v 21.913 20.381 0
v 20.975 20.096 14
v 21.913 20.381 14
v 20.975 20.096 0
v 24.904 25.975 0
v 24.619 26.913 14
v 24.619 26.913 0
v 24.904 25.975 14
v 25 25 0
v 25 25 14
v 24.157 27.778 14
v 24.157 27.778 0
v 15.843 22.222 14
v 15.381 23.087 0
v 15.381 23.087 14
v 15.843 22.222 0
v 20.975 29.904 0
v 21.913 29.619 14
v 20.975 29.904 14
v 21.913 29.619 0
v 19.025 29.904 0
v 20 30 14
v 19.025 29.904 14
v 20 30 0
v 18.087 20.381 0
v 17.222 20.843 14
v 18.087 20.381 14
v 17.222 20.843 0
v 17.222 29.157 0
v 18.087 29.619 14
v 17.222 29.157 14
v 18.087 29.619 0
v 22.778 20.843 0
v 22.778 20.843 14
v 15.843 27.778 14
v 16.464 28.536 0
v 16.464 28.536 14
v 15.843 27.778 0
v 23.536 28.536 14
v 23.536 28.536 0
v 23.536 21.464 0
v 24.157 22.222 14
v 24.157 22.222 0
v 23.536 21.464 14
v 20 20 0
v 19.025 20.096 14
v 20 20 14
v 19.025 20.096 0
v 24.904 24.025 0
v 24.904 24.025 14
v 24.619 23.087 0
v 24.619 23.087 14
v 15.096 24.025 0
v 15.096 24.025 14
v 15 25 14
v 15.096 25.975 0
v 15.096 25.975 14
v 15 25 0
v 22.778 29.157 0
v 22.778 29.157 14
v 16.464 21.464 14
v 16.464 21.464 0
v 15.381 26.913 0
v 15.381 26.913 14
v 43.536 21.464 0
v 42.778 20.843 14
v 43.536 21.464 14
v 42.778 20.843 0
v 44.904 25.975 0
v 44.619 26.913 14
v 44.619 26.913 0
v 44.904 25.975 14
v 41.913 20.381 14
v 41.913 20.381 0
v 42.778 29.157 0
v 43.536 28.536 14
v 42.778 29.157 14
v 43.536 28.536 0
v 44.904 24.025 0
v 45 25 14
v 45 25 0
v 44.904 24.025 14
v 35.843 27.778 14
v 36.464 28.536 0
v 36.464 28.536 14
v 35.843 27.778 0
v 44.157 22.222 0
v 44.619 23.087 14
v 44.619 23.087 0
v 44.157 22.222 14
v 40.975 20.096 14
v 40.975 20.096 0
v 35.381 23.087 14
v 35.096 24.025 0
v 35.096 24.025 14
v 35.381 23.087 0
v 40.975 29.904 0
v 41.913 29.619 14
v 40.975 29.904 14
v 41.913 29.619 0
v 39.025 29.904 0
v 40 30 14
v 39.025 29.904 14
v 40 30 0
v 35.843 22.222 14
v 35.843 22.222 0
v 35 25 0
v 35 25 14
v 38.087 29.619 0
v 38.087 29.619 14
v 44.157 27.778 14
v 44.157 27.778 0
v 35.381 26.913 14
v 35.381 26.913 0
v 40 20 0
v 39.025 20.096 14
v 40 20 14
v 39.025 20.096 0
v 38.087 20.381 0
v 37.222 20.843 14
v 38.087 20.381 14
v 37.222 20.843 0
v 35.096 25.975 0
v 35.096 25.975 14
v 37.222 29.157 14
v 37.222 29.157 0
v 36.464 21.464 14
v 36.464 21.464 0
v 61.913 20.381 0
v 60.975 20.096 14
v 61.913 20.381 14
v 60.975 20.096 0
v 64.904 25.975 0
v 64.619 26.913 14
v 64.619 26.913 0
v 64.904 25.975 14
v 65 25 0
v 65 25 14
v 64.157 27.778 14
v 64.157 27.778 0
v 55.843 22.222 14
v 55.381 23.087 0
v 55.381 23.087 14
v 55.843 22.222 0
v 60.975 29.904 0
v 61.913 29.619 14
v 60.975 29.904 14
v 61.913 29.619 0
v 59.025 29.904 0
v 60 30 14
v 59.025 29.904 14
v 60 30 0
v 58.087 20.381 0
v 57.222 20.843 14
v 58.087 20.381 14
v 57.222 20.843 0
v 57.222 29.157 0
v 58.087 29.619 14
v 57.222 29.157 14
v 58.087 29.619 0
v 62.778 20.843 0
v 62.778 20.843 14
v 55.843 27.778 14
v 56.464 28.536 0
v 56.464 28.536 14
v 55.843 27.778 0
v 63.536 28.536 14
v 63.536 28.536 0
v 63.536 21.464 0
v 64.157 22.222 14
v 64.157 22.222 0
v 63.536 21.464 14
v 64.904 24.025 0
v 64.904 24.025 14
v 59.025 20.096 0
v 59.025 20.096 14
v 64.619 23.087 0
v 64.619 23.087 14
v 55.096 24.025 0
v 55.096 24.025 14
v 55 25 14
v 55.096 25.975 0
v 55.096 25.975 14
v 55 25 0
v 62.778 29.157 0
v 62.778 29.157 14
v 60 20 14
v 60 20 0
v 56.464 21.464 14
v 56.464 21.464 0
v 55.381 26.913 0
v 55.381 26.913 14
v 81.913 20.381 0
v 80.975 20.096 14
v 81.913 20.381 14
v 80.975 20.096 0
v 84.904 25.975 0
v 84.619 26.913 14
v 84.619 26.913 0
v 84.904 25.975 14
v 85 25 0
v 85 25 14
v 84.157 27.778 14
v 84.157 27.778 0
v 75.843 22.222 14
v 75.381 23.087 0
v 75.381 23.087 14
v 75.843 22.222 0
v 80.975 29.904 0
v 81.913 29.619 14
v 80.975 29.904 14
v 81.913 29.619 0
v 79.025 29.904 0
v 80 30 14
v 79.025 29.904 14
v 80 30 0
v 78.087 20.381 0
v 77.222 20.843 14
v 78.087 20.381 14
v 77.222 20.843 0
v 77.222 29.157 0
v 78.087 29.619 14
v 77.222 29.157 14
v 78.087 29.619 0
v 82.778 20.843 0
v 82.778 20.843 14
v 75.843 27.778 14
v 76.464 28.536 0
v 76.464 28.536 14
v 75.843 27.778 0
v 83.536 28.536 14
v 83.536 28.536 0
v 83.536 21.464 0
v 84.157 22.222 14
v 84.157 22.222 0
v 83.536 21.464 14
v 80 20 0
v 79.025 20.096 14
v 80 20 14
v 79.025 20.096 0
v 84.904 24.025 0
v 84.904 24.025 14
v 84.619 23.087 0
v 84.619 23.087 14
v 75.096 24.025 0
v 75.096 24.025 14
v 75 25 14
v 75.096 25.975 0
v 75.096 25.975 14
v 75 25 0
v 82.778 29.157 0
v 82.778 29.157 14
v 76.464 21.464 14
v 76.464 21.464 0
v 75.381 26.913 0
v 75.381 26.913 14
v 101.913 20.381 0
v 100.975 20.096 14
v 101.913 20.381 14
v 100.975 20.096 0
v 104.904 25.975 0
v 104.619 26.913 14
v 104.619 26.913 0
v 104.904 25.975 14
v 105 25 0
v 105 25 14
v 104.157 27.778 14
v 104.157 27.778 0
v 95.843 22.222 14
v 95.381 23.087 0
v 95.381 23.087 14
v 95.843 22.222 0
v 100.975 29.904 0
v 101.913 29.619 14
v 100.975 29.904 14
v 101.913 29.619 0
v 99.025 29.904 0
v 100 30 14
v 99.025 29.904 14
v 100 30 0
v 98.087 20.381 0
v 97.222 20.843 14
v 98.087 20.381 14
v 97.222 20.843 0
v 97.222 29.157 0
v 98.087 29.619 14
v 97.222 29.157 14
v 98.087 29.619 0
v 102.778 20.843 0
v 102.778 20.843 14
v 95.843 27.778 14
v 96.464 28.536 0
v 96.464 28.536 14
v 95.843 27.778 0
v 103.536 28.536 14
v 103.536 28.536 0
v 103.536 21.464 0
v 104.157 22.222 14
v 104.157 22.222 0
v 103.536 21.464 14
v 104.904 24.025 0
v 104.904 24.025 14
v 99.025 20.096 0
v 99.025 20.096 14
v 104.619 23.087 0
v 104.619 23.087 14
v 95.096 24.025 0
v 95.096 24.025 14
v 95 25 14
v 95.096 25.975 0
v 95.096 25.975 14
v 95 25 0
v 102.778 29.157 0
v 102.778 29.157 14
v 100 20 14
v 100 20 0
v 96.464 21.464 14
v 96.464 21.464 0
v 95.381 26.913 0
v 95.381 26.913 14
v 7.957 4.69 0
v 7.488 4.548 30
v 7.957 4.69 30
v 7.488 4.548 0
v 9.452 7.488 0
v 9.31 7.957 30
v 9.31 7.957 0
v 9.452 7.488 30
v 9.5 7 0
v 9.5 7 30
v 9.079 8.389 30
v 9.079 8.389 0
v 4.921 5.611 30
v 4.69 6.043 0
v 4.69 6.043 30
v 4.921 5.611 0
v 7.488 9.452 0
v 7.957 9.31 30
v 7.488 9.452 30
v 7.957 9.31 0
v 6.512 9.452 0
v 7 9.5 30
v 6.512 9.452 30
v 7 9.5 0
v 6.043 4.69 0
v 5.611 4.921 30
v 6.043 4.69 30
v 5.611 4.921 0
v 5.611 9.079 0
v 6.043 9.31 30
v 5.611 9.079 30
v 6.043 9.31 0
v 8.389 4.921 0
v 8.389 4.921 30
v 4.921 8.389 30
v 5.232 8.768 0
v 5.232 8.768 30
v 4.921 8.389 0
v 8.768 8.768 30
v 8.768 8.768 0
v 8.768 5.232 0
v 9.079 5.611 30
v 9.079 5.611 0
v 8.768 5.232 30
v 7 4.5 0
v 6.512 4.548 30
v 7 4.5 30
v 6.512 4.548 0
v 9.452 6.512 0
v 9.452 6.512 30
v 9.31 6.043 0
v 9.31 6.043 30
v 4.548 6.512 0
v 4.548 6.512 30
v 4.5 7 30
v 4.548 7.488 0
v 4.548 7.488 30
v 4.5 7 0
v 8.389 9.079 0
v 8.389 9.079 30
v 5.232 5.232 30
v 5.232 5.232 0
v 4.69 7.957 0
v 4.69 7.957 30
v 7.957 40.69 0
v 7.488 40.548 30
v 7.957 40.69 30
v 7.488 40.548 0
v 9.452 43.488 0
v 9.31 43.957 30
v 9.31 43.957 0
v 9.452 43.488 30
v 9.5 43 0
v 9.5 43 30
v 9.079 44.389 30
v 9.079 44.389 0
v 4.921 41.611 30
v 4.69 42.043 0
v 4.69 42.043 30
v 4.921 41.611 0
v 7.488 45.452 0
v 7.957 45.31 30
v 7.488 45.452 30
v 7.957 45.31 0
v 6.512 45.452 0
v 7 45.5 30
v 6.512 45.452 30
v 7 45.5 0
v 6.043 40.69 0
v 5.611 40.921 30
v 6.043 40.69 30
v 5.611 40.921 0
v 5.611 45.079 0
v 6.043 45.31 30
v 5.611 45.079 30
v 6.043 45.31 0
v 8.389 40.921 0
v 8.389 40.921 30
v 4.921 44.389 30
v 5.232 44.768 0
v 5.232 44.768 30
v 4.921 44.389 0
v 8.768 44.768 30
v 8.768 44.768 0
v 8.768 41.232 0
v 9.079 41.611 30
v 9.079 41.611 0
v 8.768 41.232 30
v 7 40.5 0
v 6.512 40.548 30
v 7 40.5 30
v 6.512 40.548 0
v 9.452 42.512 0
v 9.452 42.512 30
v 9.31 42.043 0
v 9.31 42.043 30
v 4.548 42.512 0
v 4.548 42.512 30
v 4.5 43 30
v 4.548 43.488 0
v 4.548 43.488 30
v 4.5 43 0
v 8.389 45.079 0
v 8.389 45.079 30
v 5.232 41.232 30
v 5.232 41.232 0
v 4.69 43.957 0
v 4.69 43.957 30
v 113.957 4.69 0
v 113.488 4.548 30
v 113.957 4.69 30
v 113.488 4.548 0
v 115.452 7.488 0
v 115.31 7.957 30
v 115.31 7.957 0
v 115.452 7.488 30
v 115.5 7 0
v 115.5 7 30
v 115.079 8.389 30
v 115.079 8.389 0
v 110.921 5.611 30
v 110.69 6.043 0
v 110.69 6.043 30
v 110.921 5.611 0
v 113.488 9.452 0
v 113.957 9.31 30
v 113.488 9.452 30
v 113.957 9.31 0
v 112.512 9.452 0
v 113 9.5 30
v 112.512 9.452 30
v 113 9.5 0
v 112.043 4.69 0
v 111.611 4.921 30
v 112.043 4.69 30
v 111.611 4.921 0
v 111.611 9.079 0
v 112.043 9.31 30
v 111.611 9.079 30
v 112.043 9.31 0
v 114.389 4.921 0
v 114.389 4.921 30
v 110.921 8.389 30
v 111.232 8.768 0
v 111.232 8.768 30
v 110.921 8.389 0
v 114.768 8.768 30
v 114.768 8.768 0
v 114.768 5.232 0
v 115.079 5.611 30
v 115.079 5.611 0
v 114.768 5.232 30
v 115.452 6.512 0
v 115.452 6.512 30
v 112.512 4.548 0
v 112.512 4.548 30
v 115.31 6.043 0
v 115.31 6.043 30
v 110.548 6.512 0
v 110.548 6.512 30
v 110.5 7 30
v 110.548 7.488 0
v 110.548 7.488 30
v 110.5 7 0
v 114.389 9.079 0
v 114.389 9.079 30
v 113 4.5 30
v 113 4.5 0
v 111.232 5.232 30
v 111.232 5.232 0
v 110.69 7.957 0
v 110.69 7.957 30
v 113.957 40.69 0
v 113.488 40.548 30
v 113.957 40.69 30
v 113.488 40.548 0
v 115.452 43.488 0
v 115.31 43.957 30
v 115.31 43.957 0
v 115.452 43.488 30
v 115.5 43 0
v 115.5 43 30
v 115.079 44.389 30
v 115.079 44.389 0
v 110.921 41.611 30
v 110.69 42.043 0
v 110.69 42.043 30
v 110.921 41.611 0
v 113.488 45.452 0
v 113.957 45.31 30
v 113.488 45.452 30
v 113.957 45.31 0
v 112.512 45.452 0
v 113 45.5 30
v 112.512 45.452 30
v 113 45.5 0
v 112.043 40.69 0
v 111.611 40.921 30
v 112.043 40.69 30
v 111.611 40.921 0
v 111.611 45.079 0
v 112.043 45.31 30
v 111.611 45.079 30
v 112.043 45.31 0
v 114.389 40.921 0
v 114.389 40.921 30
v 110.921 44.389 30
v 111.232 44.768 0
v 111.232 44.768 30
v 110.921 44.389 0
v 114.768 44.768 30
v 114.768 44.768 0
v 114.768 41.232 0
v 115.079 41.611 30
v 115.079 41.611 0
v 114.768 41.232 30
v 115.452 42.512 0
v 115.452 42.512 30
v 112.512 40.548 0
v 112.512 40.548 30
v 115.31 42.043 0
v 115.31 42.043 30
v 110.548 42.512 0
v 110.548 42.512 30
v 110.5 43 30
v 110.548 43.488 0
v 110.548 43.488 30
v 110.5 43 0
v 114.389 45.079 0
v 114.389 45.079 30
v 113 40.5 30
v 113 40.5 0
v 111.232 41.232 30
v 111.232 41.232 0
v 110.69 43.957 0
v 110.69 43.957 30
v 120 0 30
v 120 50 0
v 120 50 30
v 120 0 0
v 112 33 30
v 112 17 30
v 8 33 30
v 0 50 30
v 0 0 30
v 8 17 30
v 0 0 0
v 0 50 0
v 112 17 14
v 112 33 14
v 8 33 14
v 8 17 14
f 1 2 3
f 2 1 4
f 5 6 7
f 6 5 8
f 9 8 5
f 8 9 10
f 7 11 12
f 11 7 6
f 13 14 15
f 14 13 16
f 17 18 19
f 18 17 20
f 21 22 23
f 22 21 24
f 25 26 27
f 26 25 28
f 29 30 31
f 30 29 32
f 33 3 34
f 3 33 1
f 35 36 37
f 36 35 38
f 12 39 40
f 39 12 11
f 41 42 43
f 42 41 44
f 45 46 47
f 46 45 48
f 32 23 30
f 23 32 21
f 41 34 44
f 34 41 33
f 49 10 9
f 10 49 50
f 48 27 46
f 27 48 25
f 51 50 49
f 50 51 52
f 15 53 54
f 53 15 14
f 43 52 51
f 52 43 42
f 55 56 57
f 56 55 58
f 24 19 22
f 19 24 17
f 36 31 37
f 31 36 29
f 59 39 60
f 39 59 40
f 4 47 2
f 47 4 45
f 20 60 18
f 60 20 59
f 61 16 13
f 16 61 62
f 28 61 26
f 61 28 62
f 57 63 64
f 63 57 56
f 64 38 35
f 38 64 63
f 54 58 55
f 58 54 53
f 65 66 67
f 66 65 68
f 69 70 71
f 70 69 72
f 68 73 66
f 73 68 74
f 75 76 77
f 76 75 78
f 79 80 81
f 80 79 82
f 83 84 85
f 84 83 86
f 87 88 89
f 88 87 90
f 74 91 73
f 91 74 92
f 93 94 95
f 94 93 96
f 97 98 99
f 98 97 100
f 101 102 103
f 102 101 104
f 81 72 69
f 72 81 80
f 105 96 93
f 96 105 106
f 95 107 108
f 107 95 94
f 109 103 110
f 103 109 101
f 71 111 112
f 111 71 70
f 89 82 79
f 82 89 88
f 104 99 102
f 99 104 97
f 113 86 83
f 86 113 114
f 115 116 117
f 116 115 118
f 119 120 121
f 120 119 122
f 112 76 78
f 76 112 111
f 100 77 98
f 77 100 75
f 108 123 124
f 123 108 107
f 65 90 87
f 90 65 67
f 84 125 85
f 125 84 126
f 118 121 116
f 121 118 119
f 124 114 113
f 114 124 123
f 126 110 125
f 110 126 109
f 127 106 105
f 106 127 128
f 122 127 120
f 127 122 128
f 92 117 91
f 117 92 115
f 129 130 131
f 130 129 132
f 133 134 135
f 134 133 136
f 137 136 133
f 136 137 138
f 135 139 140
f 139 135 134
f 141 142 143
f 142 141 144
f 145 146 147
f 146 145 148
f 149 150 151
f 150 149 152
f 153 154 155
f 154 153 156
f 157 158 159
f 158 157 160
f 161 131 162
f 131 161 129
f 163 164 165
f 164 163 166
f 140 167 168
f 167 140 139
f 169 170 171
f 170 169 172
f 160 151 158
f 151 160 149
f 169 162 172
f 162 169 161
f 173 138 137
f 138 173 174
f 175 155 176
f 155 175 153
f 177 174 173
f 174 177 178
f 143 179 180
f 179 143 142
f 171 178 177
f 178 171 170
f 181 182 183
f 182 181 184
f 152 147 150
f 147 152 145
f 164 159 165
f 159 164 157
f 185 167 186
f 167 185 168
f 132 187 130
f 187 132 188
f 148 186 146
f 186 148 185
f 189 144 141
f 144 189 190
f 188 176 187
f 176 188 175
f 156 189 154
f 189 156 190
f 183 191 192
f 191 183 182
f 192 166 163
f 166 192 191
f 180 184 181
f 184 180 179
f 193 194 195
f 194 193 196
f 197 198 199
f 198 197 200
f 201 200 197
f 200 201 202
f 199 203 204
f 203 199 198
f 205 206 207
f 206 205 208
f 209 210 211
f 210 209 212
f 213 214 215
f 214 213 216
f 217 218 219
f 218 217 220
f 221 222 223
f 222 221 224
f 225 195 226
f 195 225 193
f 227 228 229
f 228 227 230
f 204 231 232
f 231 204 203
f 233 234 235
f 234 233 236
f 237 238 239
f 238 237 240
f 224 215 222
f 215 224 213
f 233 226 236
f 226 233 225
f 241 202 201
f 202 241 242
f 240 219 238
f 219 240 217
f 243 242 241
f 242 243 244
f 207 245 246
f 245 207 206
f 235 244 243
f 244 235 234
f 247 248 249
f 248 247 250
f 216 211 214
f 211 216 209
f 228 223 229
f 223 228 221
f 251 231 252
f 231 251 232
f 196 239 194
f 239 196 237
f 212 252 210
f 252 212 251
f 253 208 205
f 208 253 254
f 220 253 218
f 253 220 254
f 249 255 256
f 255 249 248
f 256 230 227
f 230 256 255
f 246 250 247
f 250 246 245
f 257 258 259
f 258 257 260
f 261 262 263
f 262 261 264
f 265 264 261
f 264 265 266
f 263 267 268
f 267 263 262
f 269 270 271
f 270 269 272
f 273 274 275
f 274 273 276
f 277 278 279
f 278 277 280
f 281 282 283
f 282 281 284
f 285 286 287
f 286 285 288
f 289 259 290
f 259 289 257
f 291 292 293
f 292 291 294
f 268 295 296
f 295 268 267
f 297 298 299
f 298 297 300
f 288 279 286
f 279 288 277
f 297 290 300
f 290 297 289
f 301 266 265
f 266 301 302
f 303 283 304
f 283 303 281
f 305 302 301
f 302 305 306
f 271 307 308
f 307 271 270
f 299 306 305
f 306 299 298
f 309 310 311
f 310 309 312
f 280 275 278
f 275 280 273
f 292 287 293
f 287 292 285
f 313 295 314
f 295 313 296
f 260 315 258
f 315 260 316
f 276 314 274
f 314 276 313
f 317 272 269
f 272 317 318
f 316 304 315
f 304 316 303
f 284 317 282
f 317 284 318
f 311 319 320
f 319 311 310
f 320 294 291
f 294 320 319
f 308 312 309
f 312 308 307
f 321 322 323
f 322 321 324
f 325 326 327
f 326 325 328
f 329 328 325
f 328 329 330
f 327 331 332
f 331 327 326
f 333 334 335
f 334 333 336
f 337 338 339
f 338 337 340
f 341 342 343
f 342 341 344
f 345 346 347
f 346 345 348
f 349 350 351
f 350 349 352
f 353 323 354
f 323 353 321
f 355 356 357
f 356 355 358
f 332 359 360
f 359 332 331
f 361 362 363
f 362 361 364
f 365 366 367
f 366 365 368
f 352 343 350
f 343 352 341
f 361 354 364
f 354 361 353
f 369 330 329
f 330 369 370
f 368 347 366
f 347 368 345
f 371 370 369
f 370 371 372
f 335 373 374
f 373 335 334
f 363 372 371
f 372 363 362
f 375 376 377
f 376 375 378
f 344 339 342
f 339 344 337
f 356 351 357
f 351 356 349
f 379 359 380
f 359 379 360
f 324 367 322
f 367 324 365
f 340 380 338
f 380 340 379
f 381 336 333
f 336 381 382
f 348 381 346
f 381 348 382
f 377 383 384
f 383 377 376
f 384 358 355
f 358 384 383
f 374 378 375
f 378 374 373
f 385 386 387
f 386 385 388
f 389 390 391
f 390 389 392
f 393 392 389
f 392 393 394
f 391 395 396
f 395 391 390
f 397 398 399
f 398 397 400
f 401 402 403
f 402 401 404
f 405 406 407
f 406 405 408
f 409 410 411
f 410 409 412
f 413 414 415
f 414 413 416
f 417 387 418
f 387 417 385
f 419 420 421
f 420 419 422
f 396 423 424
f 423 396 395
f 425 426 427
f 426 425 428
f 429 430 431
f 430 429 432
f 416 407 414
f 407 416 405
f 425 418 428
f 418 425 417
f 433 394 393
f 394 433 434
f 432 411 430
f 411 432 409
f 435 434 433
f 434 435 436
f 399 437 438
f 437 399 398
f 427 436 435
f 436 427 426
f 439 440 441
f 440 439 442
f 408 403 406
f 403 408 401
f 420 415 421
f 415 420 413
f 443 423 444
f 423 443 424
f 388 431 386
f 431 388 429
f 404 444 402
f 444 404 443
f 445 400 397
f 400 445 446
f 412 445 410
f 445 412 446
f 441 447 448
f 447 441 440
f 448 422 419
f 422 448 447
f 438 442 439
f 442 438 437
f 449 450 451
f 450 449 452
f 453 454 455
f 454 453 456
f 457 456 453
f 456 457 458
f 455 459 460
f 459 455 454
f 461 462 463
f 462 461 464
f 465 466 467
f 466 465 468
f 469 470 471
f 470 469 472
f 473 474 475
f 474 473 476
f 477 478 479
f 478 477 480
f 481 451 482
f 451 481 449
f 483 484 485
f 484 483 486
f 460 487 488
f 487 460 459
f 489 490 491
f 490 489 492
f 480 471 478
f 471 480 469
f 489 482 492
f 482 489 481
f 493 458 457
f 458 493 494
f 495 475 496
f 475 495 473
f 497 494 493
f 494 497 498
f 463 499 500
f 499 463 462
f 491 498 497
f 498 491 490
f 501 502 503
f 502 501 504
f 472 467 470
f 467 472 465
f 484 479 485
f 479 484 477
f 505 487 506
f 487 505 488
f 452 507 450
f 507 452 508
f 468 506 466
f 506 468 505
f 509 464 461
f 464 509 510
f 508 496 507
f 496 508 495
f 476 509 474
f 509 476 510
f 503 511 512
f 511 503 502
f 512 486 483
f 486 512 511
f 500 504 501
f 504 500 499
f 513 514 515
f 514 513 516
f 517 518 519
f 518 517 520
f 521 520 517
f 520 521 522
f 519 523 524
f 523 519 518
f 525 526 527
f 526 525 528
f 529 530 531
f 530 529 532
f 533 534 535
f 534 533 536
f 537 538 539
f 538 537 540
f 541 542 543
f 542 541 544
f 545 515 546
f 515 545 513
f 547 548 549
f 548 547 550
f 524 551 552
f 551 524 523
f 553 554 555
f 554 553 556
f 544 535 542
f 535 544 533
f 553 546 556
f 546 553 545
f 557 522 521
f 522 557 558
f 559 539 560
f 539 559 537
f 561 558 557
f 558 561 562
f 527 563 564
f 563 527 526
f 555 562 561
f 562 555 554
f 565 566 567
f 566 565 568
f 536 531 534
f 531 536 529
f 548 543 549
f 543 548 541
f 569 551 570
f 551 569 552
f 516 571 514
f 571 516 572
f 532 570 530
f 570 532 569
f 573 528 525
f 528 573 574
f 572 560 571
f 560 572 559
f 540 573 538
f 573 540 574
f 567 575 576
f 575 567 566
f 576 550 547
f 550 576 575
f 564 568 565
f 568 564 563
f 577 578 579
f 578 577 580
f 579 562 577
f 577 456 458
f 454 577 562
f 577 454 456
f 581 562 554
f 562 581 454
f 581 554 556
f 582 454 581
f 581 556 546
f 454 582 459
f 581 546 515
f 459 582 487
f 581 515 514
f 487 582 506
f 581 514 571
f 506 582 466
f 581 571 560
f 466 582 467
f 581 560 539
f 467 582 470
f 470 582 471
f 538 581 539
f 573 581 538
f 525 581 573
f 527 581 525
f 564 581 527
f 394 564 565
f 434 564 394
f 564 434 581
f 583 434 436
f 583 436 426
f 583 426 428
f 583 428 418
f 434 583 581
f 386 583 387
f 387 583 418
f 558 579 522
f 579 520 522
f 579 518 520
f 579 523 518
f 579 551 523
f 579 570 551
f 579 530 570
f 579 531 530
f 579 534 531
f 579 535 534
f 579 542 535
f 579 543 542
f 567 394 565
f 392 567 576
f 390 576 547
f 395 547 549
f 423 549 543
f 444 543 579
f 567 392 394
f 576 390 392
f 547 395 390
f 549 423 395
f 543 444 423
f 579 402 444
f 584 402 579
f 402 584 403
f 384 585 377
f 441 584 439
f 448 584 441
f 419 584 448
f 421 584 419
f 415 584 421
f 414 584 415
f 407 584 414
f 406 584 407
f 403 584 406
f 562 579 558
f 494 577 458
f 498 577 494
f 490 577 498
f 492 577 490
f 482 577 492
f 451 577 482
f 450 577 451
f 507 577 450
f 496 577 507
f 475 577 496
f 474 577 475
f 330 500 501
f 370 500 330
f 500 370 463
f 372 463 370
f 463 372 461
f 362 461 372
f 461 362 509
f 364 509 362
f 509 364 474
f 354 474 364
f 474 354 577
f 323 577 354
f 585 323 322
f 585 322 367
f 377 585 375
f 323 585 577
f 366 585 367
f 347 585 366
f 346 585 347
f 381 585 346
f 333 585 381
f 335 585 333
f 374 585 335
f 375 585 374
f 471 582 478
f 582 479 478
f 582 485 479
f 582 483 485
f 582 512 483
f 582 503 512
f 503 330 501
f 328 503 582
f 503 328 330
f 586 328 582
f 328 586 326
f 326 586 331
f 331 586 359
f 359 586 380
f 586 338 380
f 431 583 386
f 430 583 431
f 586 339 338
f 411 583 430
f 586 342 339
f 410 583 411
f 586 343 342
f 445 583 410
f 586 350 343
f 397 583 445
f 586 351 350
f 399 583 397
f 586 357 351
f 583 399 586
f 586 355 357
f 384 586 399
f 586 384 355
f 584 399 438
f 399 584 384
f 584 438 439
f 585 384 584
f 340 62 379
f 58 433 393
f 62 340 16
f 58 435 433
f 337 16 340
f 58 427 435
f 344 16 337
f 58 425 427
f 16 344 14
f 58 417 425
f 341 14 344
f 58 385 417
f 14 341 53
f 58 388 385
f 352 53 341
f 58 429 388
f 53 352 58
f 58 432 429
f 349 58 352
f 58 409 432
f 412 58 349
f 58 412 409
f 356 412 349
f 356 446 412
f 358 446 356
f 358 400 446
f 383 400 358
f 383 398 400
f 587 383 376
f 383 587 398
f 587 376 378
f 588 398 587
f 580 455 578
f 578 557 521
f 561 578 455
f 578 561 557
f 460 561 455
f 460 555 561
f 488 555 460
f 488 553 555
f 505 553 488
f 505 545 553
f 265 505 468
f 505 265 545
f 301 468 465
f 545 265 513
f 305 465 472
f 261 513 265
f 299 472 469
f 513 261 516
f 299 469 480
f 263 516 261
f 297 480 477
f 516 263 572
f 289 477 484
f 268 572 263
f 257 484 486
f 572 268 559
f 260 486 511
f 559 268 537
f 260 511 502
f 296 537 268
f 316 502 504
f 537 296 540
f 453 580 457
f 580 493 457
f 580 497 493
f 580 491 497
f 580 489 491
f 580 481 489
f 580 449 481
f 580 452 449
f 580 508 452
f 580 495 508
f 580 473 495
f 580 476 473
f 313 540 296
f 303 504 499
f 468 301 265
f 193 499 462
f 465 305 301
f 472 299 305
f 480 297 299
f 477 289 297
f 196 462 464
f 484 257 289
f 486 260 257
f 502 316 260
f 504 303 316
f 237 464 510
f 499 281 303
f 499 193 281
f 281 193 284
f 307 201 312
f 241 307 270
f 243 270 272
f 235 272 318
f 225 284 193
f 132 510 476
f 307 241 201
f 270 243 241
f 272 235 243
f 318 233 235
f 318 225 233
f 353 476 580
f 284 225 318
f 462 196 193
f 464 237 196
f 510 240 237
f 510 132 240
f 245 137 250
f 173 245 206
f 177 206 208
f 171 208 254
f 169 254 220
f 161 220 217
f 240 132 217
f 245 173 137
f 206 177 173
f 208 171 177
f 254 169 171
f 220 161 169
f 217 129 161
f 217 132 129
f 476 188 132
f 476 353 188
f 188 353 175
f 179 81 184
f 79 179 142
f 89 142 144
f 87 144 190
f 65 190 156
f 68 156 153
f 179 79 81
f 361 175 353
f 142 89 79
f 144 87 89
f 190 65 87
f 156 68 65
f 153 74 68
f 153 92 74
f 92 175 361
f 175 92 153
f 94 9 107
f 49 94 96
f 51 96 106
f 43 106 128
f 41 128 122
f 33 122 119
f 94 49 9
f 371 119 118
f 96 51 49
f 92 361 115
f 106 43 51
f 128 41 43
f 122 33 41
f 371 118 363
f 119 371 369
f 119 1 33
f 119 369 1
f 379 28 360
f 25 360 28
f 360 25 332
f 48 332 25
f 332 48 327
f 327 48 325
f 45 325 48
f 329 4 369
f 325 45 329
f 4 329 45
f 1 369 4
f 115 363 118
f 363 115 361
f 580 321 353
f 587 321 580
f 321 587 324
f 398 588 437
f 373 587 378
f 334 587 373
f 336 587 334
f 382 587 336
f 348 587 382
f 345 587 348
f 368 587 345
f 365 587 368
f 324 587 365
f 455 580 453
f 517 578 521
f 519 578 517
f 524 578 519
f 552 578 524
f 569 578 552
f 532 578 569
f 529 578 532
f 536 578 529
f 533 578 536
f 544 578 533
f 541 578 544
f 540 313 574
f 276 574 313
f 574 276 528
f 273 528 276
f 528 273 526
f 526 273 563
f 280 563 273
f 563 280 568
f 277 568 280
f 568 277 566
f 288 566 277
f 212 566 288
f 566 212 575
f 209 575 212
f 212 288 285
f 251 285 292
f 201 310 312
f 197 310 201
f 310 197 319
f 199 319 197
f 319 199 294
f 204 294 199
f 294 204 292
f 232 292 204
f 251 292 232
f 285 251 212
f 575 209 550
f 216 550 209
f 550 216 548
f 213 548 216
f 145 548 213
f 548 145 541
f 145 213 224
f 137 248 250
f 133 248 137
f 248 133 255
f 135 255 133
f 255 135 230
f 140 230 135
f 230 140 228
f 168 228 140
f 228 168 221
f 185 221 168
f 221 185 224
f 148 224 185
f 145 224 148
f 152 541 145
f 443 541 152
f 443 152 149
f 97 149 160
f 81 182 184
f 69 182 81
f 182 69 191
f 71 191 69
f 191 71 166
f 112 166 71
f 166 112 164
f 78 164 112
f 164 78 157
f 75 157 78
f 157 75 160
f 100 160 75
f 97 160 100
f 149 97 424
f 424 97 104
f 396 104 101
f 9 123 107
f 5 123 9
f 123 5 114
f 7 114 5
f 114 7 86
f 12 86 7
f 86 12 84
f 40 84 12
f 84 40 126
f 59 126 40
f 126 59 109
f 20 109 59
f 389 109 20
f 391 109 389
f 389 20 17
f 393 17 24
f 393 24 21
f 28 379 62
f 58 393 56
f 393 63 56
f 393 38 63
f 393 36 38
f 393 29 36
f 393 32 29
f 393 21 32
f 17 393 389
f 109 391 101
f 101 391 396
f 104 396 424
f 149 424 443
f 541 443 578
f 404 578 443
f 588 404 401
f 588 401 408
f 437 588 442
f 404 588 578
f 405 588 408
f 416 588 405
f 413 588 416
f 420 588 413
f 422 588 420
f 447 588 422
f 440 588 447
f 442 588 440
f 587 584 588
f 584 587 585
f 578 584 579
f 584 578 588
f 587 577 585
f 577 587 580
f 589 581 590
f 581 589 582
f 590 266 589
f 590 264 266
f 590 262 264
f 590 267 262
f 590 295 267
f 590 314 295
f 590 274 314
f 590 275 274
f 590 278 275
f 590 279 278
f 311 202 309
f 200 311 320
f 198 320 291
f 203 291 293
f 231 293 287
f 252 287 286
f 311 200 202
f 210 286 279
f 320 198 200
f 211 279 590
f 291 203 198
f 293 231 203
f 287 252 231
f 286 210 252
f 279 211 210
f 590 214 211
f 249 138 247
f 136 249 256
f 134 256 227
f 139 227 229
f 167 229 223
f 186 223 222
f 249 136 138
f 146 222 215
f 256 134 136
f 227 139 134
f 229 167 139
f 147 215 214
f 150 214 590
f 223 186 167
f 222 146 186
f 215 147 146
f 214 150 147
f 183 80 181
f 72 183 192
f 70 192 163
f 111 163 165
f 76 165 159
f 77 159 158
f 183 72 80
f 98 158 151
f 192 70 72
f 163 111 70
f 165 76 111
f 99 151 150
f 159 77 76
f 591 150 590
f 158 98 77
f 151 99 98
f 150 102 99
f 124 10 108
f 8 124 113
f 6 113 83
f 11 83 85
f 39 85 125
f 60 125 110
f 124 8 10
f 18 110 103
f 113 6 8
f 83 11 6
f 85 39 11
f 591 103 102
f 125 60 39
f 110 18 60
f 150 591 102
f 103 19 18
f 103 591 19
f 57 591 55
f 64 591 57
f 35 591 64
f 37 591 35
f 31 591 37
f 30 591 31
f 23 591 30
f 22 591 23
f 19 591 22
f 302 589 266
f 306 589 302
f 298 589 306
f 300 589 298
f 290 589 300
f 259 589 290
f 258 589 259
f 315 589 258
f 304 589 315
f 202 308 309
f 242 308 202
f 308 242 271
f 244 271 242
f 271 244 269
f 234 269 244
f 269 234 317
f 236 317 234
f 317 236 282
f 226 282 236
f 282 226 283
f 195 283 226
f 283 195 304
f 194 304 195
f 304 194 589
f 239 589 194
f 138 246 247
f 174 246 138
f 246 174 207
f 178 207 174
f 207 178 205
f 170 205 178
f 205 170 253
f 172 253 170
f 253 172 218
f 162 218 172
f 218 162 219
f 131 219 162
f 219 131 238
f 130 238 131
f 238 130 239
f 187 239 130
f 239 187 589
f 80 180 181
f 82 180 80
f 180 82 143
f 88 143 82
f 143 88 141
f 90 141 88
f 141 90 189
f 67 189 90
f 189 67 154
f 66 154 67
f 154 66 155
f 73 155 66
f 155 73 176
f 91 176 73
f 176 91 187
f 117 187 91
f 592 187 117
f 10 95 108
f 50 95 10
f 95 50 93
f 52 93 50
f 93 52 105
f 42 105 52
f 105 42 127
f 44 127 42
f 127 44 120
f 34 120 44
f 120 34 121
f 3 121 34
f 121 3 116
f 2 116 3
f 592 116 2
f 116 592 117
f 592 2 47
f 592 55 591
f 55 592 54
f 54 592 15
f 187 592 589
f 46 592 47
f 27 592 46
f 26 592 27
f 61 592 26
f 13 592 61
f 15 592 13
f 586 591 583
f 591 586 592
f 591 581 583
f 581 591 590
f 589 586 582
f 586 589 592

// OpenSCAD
$fn = 32;

// ----------------------------------------------------------------------
// Manifold block: gallery_top manifold
// ----------------------------------------------------------------------

// --- parameters (mm) ---
block_l = 120;            // block length, X
block_w = 50;             // block width, Y
block_h = 30;             // block height, Z
port_d = 10;              // port bore diameter
port_pitch = 20;          // port pitch along X
gallery_d = 16;           // top gallery width, Y
gallery_depth = 16;       // gallery pocket depth
wall_p = 8;               // gallery end wall thickness, X
mnt_d = 5;                // mounting hole diameter
mnt_in = 7;               // mounting hole inset from the edges
fit_tol = 0.1;            // tolerance for press fits, mm
free_tol = 0.3;           // tolerance for clearance fits, mm

n_ports = 5;  // ports in the row
port_x0 = (block_l - (n_ports - 1) * port_pitch) / 2;  // first port X

difference() {
  cube([block_l, block_w, block_h]);
  for (i = [0 : n_ports - 1])
    translate([port_x0 + i * port_pitch, block_w / 2, -1])
      cylinder(h = block_h + 2, d = port_d);
  translate([wall_p, block_w / 2 - gallery_d / 2, block_h - gallery_depth])
    cube([block_l - 2 * wall_p, gallery_d, gallery_depth + 1]);
  for (cx = [mnt_in, block_l - mnt_in])
    for (cy = [mnt_in, block_w - mnt_in])
      translate([cx, cy, -1]) cylinder(h = block_h + 2, d = mnt_d);
}
